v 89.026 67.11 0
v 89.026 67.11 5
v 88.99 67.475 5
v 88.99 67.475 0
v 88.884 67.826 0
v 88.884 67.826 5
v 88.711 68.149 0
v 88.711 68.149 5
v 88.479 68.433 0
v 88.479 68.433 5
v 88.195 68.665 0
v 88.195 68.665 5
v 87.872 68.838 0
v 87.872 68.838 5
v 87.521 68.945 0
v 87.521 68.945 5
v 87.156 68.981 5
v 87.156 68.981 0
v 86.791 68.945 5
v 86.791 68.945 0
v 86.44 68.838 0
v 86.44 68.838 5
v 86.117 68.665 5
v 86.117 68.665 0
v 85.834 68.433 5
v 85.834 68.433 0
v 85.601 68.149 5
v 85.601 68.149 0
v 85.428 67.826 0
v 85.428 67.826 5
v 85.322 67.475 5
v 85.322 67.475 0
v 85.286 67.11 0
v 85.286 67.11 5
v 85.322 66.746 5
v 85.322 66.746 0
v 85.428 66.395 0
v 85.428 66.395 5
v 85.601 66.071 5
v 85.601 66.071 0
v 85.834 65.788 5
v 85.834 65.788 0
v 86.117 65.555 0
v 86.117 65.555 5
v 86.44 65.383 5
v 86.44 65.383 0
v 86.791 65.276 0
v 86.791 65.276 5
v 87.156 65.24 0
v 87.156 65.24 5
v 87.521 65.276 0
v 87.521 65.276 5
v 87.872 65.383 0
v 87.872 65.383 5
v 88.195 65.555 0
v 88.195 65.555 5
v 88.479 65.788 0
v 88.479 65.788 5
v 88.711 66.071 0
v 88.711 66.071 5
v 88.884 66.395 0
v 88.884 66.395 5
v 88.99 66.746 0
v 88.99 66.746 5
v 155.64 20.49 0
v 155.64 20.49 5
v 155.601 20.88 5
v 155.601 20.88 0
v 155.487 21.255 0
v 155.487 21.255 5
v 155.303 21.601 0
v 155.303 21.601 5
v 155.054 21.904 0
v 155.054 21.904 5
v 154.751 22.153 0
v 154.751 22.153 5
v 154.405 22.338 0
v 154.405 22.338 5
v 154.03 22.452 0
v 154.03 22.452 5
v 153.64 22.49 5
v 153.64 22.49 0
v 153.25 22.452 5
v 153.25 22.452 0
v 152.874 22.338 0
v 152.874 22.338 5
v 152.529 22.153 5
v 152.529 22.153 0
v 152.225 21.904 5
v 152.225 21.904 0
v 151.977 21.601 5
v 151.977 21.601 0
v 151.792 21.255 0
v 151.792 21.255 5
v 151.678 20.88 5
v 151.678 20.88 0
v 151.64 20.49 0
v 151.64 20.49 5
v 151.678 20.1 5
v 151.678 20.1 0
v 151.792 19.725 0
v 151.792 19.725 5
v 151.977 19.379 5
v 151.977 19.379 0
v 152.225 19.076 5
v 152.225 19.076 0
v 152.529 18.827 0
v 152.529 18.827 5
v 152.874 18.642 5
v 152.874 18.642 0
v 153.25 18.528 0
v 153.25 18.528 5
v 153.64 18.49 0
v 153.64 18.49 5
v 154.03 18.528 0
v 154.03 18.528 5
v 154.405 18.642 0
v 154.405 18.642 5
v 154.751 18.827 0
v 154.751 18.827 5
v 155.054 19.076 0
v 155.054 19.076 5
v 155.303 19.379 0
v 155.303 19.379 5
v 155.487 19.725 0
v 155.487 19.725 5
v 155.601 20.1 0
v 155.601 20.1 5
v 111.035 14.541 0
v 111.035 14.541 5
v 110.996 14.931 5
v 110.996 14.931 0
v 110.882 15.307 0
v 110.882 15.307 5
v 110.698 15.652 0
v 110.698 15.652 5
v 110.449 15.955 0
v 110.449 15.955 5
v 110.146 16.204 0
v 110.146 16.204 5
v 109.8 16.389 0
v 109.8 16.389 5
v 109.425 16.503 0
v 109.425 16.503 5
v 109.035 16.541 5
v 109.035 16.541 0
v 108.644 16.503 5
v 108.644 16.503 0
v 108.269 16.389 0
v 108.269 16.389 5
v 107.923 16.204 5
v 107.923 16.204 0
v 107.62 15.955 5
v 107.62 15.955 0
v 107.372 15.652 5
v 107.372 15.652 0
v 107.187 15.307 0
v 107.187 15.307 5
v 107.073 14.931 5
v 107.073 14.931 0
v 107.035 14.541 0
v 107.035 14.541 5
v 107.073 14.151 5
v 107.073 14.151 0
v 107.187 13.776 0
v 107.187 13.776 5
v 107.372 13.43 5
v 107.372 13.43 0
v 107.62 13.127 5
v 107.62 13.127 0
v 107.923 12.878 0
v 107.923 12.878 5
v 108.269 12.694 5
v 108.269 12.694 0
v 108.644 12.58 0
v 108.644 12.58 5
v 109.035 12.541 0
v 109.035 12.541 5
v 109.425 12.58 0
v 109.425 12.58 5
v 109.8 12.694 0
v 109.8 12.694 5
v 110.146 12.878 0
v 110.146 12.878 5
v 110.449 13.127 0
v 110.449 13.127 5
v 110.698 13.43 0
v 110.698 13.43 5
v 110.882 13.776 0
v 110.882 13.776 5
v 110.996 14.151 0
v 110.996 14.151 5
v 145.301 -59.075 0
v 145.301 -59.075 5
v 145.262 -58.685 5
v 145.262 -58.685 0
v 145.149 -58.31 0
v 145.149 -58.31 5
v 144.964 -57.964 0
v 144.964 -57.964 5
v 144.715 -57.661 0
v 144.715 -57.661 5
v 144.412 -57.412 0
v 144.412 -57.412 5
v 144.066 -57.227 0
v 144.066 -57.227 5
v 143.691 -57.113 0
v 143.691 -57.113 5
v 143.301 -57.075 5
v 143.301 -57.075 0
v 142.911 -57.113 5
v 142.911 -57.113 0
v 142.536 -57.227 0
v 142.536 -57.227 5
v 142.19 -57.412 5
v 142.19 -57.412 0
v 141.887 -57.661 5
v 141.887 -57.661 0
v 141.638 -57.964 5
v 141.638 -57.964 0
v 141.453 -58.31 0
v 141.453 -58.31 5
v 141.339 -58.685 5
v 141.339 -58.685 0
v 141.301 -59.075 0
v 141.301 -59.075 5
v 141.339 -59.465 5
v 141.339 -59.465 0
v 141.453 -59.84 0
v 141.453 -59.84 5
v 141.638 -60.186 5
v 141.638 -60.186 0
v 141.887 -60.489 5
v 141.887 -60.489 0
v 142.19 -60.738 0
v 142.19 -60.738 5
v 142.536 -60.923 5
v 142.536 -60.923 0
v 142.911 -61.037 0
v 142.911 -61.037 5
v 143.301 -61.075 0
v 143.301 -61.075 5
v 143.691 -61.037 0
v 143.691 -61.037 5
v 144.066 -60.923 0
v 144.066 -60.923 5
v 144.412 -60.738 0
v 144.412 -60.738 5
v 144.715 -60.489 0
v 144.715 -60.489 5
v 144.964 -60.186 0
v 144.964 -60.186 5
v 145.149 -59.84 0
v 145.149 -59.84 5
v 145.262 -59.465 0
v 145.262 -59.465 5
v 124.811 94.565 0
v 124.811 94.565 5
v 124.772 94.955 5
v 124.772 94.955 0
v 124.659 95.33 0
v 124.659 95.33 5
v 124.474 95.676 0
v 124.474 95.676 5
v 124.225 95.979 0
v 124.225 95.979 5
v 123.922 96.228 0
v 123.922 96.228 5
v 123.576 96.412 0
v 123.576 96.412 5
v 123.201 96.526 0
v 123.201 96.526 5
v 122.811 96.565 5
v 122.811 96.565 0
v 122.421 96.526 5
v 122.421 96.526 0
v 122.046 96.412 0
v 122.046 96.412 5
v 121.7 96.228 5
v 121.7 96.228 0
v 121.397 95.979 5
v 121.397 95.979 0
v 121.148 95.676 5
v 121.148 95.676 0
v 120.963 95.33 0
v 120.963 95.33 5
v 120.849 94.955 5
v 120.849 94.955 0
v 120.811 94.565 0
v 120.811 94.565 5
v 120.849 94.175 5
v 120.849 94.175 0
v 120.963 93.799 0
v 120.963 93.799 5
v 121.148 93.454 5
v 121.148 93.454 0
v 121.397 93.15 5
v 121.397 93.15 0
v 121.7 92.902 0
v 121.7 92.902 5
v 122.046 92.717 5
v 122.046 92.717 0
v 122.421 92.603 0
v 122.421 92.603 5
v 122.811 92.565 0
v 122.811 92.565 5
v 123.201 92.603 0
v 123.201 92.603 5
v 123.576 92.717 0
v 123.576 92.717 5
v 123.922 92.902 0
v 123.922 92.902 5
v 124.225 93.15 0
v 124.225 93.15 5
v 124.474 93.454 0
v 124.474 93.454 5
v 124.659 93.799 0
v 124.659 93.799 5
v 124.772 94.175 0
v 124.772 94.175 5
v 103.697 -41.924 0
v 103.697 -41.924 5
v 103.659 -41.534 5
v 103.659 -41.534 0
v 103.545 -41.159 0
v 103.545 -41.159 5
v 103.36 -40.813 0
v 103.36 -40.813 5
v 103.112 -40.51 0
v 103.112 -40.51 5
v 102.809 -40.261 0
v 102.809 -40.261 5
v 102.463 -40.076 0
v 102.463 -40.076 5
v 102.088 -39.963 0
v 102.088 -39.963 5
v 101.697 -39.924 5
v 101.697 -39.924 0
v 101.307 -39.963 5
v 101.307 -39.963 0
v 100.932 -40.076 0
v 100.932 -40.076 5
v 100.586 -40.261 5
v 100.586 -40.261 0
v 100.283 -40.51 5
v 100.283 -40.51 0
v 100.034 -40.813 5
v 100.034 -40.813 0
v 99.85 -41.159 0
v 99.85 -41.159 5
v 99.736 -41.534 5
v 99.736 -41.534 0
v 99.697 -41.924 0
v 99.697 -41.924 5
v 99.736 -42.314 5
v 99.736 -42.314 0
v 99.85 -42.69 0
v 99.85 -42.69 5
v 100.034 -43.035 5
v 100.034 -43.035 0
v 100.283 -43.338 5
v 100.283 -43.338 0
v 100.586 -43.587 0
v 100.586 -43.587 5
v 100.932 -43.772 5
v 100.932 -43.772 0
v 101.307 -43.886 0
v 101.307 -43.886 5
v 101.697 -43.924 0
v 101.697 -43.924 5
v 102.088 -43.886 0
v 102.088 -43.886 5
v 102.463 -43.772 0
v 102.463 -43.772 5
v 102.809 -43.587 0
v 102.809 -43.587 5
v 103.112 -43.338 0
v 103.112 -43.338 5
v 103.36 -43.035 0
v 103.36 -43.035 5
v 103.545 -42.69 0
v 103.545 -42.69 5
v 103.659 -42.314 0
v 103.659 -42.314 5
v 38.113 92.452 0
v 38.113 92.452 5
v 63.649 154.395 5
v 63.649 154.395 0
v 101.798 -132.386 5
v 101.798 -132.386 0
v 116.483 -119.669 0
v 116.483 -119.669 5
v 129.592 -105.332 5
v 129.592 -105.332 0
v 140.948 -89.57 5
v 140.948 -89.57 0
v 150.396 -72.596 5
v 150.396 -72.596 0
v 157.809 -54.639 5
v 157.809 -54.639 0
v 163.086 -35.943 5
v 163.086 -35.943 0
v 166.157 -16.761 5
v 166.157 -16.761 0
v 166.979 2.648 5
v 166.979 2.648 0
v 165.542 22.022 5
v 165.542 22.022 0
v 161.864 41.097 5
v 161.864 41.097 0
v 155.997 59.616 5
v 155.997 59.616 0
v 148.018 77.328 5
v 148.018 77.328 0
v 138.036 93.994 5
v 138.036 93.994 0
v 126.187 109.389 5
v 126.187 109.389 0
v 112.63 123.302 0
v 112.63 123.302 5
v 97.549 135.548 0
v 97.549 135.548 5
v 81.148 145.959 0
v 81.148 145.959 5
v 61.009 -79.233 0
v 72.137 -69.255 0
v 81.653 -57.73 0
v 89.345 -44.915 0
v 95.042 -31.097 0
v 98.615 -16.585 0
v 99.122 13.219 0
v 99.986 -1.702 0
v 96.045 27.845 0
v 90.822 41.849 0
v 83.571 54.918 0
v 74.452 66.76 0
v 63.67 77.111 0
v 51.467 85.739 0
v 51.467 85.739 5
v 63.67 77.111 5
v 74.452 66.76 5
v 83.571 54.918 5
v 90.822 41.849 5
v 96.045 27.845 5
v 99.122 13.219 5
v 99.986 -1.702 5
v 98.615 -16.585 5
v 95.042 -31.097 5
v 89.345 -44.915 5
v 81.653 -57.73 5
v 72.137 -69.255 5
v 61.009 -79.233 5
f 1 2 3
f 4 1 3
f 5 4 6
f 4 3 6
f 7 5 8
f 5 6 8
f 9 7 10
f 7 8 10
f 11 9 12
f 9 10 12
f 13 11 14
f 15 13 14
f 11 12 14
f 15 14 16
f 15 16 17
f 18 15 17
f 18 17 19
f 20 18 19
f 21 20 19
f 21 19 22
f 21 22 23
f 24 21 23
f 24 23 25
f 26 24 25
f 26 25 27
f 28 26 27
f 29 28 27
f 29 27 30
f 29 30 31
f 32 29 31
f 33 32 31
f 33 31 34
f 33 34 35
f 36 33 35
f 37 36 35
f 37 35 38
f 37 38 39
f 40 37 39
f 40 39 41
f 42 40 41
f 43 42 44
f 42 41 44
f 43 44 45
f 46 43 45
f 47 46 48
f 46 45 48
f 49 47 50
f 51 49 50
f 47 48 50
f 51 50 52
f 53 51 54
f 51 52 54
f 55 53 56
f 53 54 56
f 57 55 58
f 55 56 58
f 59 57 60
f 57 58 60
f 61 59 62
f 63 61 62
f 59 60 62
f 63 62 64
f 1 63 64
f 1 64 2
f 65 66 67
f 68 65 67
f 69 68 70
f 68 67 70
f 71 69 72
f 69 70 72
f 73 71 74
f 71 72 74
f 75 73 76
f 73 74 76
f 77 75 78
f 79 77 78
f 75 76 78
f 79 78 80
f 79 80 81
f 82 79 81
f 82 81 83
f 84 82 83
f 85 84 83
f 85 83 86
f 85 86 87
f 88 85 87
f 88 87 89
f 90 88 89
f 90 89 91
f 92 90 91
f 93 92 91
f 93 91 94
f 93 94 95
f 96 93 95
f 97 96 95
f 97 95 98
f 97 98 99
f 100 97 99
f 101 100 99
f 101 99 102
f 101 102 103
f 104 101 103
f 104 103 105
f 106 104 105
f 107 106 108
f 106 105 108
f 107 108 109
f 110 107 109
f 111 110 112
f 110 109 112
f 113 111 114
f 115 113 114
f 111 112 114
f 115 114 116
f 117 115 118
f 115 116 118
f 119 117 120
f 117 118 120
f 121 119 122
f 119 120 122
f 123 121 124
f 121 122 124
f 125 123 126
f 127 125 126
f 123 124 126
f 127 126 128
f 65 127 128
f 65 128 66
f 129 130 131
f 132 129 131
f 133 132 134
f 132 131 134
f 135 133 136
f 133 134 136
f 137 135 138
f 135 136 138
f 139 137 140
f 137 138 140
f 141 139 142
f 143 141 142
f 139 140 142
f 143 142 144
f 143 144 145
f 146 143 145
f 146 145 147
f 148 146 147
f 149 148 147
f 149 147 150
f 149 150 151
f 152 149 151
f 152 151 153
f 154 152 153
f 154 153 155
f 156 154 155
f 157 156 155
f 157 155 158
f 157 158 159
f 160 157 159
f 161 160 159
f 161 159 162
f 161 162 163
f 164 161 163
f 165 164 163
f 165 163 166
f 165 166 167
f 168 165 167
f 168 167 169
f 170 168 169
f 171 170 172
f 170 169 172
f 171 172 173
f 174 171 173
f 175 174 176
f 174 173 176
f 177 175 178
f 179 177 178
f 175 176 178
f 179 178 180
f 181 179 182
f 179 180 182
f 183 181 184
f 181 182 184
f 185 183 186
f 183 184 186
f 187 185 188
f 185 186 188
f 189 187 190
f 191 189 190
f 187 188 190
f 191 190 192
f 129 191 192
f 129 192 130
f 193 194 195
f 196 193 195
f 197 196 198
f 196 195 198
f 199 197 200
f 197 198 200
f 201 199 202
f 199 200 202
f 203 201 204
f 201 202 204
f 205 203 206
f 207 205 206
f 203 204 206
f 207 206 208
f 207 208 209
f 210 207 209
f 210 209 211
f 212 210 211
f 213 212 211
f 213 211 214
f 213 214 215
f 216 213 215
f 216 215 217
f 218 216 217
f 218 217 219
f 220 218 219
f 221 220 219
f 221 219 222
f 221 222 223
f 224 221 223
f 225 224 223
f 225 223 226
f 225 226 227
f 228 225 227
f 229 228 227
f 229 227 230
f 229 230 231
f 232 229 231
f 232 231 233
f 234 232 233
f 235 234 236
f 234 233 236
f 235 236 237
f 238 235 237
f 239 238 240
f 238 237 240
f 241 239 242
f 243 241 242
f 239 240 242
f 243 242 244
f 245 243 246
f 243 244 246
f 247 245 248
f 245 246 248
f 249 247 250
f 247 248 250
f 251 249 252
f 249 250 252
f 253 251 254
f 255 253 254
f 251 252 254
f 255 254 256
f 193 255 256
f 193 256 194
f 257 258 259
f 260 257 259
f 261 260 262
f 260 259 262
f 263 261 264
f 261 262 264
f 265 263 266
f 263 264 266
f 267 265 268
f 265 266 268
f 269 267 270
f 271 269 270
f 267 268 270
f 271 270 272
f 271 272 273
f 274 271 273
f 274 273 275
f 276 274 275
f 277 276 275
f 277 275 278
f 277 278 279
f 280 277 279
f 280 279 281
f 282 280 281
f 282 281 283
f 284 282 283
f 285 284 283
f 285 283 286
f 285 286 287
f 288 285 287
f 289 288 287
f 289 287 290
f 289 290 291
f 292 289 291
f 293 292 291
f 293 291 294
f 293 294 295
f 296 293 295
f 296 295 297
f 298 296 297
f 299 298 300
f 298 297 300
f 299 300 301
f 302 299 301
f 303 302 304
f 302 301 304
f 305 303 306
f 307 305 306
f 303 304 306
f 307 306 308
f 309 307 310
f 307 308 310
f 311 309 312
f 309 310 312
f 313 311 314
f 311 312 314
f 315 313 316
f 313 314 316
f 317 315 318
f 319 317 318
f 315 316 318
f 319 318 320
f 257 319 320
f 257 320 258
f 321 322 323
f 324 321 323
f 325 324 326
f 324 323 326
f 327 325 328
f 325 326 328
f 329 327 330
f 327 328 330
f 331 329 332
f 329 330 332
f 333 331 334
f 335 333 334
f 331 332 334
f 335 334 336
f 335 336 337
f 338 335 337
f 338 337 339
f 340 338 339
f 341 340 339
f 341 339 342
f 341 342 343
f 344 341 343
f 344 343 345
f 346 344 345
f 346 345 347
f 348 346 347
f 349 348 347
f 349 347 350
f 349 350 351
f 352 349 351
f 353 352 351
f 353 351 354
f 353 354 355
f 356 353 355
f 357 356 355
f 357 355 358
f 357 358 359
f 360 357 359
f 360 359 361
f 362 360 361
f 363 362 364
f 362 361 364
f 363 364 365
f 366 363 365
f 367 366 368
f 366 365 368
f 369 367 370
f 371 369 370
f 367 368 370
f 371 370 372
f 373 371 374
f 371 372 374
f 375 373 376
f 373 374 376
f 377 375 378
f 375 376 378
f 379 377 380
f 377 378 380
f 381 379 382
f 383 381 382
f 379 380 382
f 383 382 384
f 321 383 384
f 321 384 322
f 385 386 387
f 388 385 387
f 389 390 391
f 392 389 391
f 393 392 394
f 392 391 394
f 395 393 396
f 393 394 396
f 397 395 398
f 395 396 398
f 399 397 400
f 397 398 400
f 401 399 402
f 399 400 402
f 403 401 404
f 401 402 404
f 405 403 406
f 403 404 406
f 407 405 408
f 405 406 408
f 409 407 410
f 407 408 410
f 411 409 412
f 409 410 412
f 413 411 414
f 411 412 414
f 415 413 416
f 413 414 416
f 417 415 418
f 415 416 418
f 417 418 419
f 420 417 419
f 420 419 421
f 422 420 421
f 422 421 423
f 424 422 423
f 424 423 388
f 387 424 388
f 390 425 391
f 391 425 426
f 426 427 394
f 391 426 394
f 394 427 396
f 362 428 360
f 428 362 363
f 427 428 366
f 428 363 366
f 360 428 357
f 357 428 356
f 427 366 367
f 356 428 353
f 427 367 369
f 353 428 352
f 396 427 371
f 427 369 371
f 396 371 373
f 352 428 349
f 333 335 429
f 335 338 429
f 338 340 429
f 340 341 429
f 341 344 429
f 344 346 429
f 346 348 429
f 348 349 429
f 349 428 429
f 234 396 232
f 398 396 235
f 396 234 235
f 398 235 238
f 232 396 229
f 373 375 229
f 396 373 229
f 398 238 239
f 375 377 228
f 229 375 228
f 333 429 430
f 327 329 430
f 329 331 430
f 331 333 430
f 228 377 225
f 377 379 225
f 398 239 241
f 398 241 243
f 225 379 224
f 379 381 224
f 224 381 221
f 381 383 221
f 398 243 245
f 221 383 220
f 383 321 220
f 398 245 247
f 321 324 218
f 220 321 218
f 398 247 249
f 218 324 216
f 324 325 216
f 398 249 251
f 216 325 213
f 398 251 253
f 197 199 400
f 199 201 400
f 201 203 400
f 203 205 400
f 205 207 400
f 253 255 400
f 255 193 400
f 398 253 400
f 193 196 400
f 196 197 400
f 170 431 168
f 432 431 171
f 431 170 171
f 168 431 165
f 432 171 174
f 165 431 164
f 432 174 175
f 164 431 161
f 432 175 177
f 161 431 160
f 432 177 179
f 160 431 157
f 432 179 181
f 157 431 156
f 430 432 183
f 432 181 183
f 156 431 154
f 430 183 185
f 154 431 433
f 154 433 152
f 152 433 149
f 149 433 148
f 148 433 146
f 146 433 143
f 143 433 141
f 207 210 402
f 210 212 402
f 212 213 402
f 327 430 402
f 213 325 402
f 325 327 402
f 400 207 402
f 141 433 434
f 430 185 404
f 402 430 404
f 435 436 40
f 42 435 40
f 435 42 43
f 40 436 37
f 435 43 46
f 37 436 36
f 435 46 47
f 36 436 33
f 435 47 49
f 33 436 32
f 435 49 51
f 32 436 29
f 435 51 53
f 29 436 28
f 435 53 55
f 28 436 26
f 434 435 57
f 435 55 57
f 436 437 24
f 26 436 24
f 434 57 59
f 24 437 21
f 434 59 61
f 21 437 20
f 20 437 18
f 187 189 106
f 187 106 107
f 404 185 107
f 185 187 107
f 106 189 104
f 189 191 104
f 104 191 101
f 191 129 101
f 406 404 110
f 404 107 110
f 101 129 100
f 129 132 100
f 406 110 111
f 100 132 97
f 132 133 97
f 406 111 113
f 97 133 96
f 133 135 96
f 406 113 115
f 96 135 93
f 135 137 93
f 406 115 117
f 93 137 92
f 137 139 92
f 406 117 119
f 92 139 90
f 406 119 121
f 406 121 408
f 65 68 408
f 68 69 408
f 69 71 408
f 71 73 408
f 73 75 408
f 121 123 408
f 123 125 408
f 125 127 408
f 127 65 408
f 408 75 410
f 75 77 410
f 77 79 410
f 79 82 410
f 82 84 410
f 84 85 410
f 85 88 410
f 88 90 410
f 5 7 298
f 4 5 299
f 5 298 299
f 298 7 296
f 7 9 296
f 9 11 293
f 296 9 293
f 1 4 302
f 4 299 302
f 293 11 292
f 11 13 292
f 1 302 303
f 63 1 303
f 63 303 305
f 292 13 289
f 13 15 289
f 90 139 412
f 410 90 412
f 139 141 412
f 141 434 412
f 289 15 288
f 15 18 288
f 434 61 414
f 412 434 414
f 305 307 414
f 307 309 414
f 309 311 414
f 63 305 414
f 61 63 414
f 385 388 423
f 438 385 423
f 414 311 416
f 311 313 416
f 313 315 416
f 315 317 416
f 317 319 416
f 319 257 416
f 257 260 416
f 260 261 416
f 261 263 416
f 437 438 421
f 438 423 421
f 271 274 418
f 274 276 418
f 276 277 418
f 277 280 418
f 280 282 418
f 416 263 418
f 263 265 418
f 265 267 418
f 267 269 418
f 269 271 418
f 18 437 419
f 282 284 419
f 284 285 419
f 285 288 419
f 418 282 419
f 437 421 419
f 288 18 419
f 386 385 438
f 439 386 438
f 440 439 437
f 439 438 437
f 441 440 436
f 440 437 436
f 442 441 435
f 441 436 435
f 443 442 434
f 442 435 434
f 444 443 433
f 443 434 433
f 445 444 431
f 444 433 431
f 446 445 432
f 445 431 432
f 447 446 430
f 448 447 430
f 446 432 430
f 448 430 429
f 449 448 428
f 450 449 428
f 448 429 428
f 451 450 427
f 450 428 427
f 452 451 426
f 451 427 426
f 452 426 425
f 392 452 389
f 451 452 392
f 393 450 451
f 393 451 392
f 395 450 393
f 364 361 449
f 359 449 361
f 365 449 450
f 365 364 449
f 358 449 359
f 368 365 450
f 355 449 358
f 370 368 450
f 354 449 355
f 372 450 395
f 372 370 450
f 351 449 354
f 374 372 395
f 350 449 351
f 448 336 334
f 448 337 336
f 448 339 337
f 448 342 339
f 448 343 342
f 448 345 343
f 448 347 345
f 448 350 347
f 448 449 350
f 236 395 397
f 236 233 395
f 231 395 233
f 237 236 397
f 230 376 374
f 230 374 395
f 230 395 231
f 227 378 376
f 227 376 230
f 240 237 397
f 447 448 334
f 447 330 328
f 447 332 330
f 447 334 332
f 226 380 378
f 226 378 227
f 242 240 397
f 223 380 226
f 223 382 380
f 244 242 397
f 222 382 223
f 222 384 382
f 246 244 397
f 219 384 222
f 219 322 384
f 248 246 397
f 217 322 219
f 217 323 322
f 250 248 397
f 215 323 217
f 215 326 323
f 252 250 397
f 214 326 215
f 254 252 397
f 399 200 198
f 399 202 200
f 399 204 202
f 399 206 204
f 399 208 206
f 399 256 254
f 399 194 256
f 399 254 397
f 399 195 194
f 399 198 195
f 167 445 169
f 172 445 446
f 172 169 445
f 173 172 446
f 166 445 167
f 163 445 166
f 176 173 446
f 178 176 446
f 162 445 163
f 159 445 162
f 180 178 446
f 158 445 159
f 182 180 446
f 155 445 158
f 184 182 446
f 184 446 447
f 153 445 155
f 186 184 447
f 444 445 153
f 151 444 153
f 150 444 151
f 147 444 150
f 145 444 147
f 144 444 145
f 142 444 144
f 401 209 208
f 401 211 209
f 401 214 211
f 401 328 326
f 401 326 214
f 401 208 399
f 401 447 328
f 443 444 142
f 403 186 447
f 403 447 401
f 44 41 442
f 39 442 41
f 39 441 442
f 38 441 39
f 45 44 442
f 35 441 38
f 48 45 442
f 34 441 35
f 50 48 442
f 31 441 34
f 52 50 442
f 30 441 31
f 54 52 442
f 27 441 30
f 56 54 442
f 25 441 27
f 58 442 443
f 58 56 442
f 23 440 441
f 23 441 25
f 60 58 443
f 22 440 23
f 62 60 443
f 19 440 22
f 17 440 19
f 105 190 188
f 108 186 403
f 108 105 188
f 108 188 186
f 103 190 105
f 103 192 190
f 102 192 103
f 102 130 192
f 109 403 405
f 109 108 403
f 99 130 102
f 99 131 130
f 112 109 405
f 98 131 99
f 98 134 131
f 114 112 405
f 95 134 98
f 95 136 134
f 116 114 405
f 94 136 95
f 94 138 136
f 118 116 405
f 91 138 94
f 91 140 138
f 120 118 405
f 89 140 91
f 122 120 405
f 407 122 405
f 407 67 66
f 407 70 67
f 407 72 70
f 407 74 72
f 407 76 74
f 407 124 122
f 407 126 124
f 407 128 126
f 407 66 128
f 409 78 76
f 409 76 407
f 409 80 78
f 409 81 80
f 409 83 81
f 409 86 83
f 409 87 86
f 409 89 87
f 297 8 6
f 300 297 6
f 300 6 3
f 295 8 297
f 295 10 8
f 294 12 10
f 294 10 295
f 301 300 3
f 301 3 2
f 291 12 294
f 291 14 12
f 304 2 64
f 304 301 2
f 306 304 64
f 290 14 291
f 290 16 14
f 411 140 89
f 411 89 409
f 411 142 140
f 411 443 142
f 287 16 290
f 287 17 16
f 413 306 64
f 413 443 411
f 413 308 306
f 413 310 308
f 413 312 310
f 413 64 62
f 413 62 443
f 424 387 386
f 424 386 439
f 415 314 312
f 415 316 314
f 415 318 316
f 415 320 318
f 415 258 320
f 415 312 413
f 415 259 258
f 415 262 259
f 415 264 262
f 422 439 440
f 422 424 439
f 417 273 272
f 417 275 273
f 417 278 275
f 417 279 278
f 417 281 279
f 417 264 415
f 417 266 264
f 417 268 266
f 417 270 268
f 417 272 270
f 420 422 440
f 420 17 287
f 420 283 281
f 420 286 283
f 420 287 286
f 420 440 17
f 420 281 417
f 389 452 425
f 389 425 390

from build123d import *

# Parameters (mm, degrees)
BOSS_EXTRU_2_DEPTH      = 5
ENL_V_MAT_EXTRU_1_DEPTH = 10
ESQUISSE3_W             = 70.825033907
ESQUISSE3_H             = 52.172348309
ENL_V_MAT_EXTRU_2_DEPTH = 10
ESQUISSE4_R             = 2
ESQUISSE4_R_2           = 1.87013138
ENL_V_MAT_EXTRU_3_DEPTH = 10
ENL_V_MAT_EXTRU_4_DEPTH = 10


with BuildPart() as part:
    # Esquisse1 → Boss.-Extru.2 (new body)
    with BuildSketch(Plane.XY):
        with BuildLine():
            Line((-2, 166.988023523), (-2, 99.979998))
            ThreePointArc((-2, 99.979998), (100, 0), (-2, -99.979998))
            Line((-2, -99.979998), (-2, -166.988023523))
            ThreePointArc((-2, -166.988023523), (167, 0), (-2, 166.988023523))
        make_face()
    extrude(amount=BOSS_EXTRU_2_DEPTH)

    # Esquisse2 → Enlèv. mat.-Extru.1 (cut)
    with BuildSketch(Plane.XY.offset(5)):
        Polygon((29.390638032, 43.425593165), (38.112910781, 92.452182407), (63.648561005, 154.395144619), (68.028776979, 172.275239399), (-24.955464007, 192.914301625), (-14.988060504, 82.801476905), align=None)
        Polygon((56.192163409, 19.645406226), (29.390638032, 43.425593165), (-11.148286352, -184.437631398), (102.415881909, -156.025065414), (102.415881909, -133.007210905), (53.907034164, -84.226074749), align=None)
    extrude(amount=-ENL_V_MAT_EXTRU_1_DEPTH, mode=Mode.SUBTRACT)

    # Esquisse3 → Enlèv. mat.-Extru.2 (cut)
    with BuildSketch(Plane.XY.offset(5)):
        with Locations((-10.008332903, -121.270932698)):
            Rectangle(ESQUISSE3_W, ESQUISSE3_H)
    extrude(amount=-ENL_V_MAT_EXTRU_2_DEPTH, mode=Mode.SUBTRACT)

    # Esquisse4 → Enlèv. mat.-Extru.3 (cut)
    with BuildSketch(Plane.XY.offset(5)):
        with Locations((109.034633389, 14.54127648)):
            Circle(ESQUISSE4_R)
        with Locations((101.697400647, -41.92420186)):
            Circle(ESQUISSE4_R)
        with Locations((87.156124167, 67.11043153)):
            Circle(ESQUISSE4_R_2)
        with Locations((122.810902236, 94.564698974)):
            Circle(ESQUISSE4_R)
        with Locations((143.30088273, -59.075011711)):
            Circle(ESQUISSE4_R)
        with Locations((153.639710685, 20.489980494)):
            Circle(ESQUISSE4_R)
    extrude(amount=-ENL_V_MAT_EXTRU_3_DEPTH, mode=Mode.SUBTRACT)

    # Esquisse5 → Enlèv. mat.-Extru.4 (cut)
    with BuildSketch(Plane.XY.offset(5)):
        Polygon((61.009483209, -79.232840152), (101.798321541, -132.386184065), (46.643469874, -98.897205978), (43.215654561, -74.196784885), (51.84018638, -72.999910462), align=None)
    extrude(amount=-ENL_V_MAT_EXTRU_4_DEPTH, mode=Mode.SUBTRACT)


solid = part.part
